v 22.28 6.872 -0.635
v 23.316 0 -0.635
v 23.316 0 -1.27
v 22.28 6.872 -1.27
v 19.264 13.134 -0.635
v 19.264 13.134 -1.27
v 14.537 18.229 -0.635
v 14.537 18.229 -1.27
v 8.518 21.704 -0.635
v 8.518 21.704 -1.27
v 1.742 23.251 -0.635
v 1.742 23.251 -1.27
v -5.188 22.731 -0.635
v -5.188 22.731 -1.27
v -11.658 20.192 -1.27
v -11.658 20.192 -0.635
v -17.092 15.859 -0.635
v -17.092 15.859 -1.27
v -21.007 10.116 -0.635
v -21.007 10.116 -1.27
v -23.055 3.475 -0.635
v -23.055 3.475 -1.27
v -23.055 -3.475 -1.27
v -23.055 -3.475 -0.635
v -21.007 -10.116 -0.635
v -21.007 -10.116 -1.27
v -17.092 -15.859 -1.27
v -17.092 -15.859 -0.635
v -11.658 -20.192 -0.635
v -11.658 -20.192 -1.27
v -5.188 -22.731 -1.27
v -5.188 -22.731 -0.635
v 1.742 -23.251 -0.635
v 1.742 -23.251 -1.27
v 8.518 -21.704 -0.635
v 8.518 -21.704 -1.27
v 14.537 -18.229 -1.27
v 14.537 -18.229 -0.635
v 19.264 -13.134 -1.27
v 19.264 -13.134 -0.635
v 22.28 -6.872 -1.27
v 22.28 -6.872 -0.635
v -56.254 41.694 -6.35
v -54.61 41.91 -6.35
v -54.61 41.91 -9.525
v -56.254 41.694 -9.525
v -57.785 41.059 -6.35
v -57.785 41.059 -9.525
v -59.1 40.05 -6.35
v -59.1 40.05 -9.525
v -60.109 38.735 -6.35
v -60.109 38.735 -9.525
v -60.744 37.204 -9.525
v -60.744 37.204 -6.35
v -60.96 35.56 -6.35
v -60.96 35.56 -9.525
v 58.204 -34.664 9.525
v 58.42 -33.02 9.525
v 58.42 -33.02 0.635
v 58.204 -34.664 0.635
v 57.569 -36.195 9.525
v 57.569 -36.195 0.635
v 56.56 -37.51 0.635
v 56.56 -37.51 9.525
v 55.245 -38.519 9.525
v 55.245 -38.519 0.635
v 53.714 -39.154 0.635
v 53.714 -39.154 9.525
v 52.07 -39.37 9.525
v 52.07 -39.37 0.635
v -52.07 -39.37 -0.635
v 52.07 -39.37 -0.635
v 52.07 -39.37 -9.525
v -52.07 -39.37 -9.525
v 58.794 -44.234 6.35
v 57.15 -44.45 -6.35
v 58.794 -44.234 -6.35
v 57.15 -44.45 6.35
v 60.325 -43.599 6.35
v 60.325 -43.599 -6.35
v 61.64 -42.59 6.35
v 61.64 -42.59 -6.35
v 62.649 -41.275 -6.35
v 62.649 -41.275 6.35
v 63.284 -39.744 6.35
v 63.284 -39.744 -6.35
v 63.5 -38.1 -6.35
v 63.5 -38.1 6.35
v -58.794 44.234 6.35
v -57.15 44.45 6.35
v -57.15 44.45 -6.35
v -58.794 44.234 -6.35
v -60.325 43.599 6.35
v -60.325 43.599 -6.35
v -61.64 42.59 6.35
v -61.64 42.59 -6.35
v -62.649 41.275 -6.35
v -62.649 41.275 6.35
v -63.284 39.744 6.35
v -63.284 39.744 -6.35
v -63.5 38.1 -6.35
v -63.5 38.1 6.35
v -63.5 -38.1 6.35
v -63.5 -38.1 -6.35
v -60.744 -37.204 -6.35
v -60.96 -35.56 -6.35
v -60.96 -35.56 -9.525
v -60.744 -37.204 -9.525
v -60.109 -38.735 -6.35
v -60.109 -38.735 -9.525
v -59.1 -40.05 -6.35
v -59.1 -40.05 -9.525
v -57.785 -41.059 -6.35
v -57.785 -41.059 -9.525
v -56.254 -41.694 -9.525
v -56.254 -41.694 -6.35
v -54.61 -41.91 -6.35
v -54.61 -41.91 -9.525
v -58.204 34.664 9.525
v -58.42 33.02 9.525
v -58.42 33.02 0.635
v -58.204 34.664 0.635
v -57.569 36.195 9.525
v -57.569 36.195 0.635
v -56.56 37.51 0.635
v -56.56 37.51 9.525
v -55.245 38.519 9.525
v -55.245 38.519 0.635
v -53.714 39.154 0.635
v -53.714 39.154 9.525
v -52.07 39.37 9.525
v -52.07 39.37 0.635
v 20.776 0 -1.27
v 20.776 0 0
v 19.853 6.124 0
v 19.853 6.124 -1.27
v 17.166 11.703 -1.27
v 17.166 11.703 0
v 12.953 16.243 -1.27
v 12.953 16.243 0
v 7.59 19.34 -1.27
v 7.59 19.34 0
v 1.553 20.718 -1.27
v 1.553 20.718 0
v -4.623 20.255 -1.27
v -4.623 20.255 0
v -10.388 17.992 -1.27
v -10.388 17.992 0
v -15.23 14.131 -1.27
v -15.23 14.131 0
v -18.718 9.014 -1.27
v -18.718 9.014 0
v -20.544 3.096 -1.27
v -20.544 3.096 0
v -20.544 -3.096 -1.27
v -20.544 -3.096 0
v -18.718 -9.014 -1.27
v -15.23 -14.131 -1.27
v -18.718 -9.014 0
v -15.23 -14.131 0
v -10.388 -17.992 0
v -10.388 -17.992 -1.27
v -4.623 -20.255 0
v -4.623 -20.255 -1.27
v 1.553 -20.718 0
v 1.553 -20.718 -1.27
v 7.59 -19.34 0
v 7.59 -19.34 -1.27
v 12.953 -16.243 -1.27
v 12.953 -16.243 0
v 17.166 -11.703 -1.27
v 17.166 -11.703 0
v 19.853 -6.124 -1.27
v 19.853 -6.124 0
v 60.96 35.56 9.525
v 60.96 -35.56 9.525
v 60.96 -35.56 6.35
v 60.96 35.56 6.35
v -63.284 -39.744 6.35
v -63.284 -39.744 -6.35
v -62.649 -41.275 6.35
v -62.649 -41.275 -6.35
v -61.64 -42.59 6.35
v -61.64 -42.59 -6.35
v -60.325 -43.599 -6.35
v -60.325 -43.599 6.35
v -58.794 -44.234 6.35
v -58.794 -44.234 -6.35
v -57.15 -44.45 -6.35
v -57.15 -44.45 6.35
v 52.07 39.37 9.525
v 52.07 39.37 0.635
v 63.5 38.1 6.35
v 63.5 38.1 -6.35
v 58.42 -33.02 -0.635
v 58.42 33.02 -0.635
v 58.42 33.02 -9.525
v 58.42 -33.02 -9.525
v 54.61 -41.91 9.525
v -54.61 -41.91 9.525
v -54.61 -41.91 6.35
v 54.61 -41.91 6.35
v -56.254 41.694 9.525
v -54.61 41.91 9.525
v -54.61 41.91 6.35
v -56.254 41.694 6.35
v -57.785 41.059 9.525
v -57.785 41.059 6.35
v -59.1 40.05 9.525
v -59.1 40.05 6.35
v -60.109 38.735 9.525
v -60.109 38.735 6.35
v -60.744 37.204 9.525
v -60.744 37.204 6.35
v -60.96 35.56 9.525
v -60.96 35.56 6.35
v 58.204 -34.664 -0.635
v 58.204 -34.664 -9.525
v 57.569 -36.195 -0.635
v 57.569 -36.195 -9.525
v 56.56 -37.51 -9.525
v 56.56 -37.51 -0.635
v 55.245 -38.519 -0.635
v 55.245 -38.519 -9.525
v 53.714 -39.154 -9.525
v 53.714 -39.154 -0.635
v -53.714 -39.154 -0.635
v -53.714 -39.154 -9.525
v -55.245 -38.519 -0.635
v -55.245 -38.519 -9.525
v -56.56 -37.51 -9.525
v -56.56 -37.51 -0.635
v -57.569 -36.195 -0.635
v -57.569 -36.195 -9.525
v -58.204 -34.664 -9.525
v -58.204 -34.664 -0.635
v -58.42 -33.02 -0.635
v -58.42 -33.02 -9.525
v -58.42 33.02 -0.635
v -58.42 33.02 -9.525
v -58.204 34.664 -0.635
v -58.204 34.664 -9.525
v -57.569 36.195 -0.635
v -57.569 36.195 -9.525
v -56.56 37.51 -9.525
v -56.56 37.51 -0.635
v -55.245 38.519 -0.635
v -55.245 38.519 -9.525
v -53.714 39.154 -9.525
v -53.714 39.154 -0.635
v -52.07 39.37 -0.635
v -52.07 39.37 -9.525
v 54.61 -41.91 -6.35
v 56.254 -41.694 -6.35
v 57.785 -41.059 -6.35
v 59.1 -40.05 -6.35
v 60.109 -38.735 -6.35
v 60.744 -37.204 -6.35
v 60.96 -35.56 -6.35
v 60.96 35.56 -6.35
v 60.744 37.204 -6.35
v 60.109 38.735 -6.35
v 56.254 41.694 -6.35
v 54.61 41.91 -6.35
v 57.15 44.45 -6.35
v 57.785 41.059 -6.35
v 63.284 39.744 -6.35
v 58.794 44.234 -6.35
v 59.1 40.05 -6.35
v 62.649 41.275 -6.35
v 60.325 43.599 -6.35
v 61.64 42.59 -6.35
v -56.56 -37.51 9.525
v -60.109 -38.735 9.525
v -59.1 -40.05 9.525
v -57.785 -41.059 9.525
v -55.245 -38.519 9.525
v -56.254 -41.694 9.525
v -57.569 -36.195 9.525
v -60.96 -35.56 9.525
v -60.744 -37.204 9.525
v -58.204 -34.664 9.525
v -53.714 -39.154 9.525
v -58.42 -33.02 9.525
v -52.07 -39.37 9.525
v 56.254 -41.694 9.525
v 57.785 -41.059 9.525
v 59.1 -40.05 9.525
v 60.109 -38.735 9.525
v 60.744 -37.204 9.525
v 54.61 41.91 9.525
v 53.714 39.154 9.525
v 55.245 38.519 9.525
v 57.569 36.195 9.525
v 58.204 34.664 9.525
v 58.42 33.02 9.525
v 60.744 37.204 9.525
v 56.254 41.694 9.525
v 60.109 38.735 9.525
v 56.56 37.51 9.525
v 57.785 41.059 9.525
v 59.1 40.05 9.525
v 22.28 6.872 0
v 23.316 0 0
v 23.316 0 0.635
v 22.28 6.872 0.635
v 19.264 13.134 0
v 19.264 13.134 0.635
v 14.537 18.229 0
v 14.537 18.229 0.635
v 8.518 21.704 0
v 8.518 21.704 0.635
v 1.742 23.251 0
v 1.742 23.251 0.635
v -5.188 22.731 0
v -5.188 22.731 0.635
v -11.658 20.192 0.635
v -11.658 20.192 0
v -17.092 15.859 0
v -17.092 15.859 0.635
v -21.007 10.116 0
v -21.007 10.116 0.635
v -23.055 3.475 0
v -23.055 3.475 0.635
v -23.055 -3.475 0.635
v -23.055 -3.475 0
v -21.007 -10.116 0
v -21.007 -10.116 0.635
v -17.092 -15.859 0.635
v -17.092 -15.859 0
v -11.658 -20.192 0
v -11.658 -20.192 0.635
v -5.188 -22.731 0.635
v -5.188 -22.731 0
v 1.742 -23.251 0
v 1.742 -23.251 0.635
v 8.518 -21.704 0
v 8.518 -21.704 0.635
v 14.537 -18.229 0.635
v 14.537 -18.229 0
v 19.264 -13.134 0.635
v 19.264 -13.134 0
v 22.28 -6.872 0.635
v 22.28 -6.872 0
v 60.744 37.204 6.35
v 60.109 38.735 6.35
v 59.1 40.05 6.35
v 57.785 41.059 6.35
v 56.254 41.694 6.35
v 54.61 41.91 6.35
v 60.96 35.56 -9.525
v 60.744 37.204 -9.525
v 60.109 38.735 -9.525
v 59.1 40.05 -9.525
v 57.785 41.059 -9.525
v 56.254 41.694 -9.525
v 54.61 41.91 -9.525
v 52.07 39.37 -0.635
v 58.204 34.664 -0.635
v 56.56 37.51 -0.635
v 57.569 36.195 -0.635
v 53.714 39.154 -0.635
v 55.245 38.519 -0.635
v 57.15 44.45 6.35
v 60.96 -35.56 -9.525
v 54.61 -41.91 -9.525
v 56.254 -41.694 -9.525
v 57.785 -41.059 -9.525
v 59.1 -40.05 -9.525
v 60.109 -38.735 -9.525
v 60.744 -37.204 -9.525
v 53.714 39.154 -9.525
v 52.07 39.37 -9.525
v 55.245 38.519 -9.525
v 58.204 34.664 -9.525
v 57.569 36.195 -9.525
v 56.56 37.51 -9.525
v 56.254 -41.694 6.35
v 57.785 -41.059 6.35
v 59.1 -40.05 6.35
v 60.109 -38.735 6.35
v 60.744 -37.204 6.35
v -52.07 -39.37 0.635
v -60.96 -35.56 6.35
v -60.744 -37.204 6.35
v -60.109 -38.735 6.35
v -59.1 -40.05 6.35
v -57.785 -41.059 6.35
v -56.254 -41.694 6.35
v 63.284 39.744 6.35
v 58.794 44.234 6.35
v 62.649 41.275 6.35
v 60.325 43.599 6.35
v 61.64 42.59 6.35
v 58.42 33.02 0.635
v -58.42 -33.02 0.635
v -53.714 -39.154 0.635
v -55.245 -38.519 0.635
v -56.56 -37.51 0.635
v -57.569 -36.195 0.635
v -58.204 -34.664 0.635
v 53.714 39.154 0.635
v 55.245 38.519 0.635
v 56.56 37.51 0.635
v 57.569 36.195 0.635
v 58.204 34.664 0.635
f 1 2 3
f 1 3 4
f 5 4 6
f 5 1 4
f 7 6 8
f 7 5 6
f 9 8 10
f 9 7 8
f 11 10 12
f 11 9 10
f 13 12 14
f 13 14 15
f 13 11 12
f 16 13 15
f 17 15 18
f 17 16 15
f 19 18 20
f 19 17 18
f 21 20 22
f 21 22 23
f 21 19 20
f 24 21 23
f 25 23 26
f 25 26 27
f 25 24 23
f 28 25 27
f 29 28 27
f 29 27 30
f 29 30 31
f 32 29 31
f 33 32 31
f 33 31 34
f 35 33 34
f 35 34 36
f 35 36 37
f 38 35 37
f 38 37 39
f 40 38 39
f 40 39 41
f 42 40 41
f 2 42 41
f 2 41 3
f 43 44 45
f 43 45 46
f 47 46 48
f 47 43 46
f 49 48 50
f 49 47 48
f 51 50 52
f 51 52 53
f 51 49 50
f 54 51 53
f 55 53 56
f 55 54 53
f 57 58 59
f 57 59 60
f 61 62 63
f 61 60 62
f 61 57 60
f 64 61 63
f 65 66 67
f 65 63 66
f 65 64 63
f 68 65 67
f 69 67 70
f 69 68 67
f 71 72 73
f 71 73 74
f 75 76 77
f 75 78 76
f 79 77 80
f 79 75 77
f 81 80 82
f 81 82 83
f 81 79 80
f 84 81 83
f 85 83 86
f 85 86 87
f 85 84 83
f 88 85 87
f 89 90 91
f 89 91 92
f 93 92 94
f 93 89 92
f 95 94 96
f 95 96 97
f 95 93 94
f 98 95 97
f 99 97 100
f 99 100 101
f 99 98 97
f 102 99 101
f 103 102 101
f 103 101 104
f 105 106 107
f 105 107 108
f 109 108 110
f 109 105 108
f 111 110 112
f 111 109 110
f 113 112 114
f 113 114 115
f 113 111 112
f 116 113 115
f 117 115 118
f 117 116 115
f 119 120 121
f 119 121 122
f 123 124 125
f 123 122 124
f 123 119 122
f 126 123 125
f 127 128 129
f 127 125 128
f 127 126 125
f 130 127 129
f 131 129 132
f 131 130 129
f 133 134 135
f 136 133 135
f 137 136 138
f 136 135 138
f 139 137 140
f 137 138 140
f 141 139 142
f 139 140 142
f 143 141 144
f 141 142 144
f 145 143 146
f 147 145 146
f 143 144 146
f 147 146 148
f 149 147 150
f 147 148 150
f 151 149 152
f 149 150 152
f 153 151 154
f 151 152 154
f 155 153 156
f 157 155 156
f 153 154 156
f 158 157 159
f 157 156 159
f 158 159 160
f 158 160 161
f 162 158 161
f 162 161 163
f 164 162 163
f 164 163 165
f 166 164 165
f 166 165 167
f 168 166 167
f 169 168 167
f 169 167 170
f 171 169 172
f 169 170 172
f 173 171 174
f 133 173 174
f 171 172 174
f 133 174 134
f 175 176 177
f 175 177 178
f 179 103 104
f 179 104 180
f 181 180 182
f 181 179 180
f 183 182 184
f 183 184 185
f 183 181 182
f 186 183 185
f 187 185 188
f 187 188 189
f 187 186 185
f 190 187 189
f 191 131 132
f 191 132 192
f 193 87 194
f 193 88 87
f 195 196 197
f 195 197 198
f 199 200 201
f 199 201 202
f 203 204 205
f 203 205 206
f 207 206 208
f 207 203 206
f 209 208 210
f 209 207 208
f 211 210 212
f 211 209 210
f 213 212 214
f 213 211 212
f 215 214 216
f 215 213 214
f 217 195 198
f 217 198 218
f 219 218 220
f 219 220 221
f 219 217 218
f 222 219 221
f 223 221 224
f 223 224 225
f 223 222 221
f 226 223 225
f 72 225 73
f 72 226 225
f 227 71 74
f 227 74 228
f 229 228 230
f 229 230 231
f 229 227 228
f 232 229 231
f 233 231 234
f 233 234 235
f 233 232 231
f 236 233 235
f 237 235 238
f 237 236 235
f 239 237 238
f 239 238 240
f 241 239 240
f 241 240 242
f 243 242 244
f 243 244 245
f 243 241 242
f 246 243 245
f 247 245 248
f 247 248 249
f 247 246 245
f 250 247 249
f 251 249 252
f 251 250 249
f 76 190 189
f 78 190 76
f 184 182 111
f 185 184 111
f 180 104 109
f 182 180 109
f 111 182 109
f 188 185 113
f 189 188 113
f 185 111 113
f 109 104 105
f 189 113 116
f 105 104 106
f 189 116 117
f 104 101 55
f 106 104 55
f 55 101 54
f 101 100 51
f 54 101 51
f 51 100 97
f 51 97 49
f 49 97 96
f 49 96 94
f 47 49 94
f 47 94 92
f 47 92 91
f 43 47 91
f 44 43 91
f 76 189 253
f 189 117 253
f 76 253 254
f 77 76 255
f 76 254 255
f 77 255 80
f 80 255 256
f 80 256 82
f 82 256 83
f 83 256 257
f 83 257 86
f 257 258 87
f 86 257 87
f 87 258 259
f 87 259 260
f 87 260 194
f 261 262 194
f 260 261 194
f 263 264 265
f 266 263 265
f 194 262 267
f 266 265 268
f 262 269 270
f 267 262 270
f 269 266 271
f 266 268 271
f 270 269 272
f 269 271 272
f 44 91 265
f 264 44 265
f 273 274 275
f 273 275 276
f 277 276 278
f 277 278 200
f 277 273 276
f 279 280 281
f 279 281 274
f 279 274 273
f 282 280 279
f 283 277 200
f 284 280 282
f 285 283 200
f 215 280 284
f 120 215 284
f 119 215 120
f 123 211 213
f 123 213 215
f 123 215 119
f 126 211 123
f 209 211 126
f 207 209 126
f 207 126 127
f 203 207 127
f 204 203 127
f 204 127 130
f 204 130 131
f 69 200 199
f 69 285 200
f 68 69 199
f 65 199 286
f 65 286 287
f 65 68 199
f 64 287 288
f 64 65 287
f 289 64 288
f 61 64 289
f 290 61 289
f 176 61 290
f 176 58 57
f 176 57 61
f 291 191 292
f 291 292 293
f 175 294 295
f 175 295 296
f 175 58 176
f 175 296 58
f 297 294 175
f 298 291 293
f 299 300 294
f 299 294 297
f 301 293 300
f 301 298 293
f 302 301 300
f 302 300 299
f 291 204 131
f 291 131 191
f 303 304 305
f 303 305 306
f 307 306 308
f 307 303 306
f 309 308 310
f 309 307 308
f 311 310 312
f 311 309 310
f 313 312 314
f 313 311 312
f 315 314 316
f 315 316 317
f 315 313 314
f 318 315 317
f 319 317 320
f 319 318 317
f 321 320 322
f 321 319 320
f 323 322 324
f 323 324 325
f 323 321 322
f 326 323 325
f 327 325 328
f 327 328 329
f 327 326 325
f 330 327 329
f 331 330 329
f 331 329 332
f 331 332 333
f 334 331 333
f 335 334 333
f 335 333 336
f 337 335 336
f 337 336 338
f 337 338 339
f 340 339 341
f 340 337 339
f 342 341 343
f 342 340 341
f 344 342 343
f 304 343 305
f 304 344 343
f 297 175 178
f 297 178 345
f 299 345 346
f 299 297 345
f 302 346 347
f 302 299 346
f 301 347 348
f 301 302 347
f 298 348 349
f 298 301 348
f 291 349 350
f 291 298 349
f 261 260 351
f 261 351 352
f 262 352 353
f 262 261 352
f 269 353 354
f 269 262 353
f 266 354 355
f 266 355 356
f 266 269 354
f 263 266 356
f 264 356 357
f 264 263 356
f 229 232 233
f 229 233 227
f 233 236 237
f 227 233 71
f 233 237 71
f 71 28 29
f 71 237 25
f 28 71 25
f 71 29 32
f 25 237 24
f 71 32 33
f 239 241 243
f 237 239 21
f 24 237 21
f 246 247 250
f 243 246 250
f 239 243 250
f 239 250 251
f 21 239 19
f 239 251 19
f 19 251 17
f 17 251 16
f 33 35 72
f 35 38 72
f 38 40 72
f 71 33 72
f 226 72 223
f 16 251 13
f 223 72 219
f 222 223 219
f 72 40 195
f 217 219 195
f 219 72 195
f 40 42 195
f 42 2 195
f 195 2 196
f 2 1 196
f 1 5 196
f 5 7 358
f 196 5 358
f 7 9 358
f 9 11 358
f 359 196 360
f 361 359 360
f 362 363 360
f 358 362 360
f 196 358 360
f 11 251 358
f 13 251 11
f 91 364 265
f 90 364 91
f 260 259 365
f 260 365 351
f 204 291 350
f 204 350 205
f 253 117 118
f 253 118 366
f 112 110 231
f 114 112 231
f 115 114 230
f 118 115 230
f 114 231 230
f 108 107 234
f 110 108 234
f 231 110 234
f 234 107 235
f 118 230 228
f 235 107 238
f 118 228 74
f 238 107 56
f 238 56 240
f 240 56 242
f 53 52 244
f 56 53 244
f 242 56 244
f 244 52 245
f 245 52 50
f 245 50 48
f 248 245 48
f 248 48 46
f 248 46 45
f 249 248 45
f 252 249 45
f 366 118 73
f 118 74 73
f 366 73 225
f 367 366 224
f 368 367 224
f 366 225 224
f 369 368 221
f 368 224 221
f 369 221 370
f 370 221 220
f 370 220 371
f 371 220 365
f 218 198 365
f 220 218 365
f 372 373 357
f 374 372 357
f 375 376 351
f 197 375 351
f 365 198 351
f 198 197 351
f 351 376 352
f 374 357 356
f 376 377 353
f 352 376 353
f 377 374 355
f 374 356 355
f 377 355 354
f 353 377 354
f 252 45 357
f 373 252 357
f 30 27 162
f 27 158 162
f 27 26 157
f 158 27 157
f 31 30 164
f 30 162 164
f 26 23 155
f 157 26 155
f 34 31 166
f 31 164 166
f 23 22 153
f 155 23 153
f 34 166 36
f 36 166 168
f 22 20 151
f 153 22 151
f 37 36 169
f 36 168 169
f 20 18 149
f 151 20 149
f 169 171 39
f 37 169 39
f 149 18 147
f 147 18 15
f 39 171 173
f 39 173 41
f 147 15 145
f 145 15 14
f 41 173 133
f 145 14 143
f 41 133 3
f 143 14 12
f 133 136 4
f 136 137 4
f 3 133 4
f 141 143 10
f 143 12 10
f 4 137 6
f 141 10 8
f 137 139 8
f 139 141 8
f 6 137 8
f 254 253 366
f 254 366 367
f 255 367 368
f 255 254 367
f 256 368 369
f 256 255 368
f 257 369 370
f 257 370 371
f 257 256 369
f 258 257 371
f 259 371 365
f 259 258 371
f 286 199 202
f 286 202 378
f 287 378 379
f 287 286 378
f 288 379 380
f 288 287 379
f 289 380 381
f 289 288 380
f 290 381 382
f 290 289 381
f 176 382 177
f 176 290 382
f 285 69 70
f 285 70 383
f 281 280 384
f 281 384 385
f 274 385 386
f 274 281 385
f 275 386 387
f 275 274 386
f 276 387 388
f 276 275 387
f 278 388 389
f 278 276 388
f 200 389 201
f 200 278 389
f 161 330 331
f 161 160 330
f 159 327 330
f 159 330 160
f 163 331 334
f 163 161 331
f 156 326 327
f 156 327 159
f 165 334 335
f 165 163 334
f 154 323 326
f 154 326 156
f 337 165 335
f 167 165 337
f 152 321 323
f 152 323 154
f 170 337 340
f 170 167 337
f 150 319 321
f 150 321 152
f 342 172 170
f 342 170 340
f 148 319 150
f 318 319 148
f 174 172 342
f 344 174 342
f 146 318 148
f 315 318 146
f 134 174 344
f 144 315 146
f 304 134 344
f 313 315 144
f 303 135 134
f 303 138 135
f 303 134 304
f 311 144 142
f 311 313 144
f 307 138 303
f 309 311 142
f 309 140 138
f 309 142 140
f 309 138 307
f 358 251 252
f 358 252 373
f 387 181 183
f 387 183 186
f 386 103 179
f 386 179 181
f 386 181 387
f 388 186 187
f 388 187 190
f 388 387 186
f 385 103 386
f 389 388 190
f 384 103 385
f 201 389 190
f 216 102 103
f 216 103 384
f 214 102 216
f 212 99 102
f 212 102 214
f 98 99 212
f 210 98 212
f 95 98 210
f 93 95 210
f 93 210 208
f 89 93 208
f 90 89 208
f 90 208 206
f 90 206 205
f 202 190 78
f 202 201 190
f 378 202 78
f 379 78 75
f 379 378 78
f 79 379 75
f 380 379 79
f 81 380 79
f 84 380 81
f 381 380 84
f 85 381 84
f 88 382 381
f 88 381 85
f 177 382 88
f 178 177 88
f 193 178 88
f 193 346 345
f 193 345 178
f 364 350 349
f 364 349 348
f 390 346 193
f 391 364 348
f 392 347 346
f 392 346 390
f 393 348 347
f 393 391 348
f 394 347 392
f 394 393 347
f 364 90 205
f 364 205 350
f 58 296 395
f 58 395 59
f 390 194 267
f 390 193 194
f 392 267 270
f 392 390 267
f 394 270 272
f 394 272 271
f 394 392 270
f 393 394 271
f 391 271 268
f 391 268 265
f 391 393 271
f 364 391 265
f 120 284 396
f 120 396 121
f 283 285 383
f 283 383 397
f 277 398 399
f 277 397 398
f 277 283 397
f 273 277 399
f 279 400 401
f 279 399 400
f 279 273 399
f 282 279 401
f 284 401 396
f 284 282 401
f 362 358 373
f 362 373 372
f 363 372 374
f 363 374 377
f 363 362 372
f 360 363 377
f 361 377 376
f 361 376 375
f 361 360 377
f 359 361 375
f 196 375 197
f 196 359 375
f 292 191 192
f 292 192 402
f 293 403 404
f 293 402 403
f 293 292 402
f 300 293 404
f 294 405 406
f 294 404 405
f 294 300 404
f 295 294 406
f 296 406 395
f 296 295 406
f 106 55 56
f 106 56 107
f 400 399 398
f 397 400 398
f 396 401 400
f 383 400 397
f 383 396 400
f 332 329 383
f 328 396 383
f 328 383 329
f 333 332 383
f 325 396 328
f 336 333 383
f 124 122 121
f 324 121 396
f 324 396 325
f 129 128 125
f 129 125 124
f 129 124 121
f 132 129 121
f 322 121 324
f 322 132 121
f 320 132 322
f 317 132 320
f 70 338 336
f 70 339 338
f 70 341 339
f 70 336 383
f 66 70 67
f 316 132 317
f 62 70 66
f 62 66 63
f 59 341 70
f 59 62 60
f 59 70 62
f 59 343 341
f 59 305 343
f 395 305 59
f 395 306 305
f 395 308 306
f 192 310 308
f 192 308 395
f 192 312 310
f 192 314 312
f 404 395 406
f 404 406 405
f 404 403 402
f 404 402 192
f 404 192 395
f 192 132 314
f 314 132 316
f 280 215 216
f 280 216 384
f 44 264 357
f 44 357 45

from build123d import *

# Parameters (mm, degrees)
F1_DEPTH = 6.35
F2_DEPTH = 9.525
F0_R     = 23.315742
F3_DEPTH = 0.635
F0_R_2   = 20.775742
F4_DEPTH = 1.27


with BuildPart() as f1:
    # F0 (on Top) → F1 (new body, symmetric)
    with BuildSketch(Plane.XY):
        with BuildLine():
            Line((57.15, 44.45), (-57.15, 44.45))
            ThreePointArc((-57.15, 44.45), (-61.640128, 42.590128), (-63.5, 38.1))
            Line((-63.5, 38.1), (-63.5, -38.1))
            ThreePointArc((-63.5, -38.1), (-61.640128, -42.590128), (-57.15, -44.45))
            Line((-57.15, -44.45), (57.15, -44.45))
            ThreePointArc((57.15, -44.45), (61.640128, -42.590128), (63.5, -38.1))
            Line((63.5, -38.1), (63.5, 38.1))
            ThreePointArc((63.5, 38.1), (61.640128, 42.590128), (57.15, 44.45))
        make_face()
        with BuildLine():
            Line((54.61, -41.91), (-54.61, -41.91))
            ThreePointArc((-54.61, -41.91), (-59.100128, -40.050128), (-60.96, -35.56))
            Line((-60.96, -35.56), (-60.96, 35.56))
            ThreePointArc((-60.96, 35.56), (-59.100128, 40.050128), (-54.61, 41.91))
            Line((-54.61, 41.91), (54.61, 41.91))
            ThreePointArc((54.61, 41.91), (59.100128, 40.050128), (60.96, 35.56))
            Line((60.96, 35.56), (60.96, -35.56))
            ThreePointArc((60.96, -35.56), (59.100128, -40.050128), (54.61, -41.91))
        make_face(mode=Mode.SUBTRACT)
    extrude(amount=F1_DEPTH, both=True)

    # F0 (on Top) → F2 (join, symmetric)
    with BuildSketch(Plane.XY):
        with BuildLine():
            ThreePointArc((-60.96, -35.56), (-59.100128, -40.050128), (-54.61, -41.91))
            Line((-54.61, -41.91), (54.61, -41.91))
            ThreePointArc((54.61, -41.91), (59.100128, -40.050128), (60.96, -35.56))
            Line((60.96, -35.56), (60.96, 35.56))
            ThreePointArc((60.96, 35.56), (59.100128, 40.050128), (54.61, 41.91))
            Line((54.61, 41.91), (-54.61, 41.91))
            ThreePointArc((-54.61, 41.91), (-59.100128, 40.050128), (-60.96, 35.56))
            Line((-60.96, 35.56), (-60.96, -35.56))
        make_face()
        with BuildLine():
            ThreePointArc((-58.42, 33.02), (-56.560128, 37.510128), (-52.07, 39.37))
            Line((-52.07, 39.37), (52.07, 39.37))
            ThreePointArc((52.07, 39.37), (56.560128, 37.510128), (58.42, 33.02))
            Line((58.42, 33.02), (58.42, -33.02))
            ThreePointArc((58.42, -33.02), (56.560128, -37.510128), (52.07, -39.37))
            Line((52.07, -39.37), (-52.07, -39.37))
            ThreePointArc((-52.07, -39.37), (-56.560128, -37.510128), (-58.42, -33.02))
            Line((-58.42, -33.02), (-58.42, 33.02))
        make_face(mode=Mode.SUBTRACT)
    extrude(amount=F2_DEPTH, both=True)

    # F0 (on Top) → F3 (join, symmetric)
    with BuildSketch(Plane.XY):
        with BuildLine():
            Line((52.07, 39.37), (-52.07, 39.37))
            ThreePointArc((-52.07, 39.37), (-56.560128, 37.510128), (-58.42, 33.02))
            Line((-58.42, 33.02), (-58.42, -33.02))
            ThreePointArc((-58.42, -33.02), (-56.560128, -37.510128), (-52.07, -39.37))
            Line((-52.07, -39.37), (52.07, -39.37))
            ThreePointArc((52.07, -39.37), (56.560128, -37.510128), (58.42, -33.02))
            Line((58.42, -33.02), (58.42, 33.02))
            ThreePointArc((58.42, 33.02), (56.560128, 37.510128), (52.07, 39.37))
        make_face()
        Circle(F0_R, mode=Mode.SUBTRACT)
    extrude(amount=F3_DEPTH, both=True)

    # F0 (on Top) → F4 (join)
    with BuildSketch(Plane.XY):
        Circle(F0_R)
        Circle(F0_R_2, mode=Mode.SUBTRACT)
    extrude(amount=-F4_DEPTH)


solid = f1.part
